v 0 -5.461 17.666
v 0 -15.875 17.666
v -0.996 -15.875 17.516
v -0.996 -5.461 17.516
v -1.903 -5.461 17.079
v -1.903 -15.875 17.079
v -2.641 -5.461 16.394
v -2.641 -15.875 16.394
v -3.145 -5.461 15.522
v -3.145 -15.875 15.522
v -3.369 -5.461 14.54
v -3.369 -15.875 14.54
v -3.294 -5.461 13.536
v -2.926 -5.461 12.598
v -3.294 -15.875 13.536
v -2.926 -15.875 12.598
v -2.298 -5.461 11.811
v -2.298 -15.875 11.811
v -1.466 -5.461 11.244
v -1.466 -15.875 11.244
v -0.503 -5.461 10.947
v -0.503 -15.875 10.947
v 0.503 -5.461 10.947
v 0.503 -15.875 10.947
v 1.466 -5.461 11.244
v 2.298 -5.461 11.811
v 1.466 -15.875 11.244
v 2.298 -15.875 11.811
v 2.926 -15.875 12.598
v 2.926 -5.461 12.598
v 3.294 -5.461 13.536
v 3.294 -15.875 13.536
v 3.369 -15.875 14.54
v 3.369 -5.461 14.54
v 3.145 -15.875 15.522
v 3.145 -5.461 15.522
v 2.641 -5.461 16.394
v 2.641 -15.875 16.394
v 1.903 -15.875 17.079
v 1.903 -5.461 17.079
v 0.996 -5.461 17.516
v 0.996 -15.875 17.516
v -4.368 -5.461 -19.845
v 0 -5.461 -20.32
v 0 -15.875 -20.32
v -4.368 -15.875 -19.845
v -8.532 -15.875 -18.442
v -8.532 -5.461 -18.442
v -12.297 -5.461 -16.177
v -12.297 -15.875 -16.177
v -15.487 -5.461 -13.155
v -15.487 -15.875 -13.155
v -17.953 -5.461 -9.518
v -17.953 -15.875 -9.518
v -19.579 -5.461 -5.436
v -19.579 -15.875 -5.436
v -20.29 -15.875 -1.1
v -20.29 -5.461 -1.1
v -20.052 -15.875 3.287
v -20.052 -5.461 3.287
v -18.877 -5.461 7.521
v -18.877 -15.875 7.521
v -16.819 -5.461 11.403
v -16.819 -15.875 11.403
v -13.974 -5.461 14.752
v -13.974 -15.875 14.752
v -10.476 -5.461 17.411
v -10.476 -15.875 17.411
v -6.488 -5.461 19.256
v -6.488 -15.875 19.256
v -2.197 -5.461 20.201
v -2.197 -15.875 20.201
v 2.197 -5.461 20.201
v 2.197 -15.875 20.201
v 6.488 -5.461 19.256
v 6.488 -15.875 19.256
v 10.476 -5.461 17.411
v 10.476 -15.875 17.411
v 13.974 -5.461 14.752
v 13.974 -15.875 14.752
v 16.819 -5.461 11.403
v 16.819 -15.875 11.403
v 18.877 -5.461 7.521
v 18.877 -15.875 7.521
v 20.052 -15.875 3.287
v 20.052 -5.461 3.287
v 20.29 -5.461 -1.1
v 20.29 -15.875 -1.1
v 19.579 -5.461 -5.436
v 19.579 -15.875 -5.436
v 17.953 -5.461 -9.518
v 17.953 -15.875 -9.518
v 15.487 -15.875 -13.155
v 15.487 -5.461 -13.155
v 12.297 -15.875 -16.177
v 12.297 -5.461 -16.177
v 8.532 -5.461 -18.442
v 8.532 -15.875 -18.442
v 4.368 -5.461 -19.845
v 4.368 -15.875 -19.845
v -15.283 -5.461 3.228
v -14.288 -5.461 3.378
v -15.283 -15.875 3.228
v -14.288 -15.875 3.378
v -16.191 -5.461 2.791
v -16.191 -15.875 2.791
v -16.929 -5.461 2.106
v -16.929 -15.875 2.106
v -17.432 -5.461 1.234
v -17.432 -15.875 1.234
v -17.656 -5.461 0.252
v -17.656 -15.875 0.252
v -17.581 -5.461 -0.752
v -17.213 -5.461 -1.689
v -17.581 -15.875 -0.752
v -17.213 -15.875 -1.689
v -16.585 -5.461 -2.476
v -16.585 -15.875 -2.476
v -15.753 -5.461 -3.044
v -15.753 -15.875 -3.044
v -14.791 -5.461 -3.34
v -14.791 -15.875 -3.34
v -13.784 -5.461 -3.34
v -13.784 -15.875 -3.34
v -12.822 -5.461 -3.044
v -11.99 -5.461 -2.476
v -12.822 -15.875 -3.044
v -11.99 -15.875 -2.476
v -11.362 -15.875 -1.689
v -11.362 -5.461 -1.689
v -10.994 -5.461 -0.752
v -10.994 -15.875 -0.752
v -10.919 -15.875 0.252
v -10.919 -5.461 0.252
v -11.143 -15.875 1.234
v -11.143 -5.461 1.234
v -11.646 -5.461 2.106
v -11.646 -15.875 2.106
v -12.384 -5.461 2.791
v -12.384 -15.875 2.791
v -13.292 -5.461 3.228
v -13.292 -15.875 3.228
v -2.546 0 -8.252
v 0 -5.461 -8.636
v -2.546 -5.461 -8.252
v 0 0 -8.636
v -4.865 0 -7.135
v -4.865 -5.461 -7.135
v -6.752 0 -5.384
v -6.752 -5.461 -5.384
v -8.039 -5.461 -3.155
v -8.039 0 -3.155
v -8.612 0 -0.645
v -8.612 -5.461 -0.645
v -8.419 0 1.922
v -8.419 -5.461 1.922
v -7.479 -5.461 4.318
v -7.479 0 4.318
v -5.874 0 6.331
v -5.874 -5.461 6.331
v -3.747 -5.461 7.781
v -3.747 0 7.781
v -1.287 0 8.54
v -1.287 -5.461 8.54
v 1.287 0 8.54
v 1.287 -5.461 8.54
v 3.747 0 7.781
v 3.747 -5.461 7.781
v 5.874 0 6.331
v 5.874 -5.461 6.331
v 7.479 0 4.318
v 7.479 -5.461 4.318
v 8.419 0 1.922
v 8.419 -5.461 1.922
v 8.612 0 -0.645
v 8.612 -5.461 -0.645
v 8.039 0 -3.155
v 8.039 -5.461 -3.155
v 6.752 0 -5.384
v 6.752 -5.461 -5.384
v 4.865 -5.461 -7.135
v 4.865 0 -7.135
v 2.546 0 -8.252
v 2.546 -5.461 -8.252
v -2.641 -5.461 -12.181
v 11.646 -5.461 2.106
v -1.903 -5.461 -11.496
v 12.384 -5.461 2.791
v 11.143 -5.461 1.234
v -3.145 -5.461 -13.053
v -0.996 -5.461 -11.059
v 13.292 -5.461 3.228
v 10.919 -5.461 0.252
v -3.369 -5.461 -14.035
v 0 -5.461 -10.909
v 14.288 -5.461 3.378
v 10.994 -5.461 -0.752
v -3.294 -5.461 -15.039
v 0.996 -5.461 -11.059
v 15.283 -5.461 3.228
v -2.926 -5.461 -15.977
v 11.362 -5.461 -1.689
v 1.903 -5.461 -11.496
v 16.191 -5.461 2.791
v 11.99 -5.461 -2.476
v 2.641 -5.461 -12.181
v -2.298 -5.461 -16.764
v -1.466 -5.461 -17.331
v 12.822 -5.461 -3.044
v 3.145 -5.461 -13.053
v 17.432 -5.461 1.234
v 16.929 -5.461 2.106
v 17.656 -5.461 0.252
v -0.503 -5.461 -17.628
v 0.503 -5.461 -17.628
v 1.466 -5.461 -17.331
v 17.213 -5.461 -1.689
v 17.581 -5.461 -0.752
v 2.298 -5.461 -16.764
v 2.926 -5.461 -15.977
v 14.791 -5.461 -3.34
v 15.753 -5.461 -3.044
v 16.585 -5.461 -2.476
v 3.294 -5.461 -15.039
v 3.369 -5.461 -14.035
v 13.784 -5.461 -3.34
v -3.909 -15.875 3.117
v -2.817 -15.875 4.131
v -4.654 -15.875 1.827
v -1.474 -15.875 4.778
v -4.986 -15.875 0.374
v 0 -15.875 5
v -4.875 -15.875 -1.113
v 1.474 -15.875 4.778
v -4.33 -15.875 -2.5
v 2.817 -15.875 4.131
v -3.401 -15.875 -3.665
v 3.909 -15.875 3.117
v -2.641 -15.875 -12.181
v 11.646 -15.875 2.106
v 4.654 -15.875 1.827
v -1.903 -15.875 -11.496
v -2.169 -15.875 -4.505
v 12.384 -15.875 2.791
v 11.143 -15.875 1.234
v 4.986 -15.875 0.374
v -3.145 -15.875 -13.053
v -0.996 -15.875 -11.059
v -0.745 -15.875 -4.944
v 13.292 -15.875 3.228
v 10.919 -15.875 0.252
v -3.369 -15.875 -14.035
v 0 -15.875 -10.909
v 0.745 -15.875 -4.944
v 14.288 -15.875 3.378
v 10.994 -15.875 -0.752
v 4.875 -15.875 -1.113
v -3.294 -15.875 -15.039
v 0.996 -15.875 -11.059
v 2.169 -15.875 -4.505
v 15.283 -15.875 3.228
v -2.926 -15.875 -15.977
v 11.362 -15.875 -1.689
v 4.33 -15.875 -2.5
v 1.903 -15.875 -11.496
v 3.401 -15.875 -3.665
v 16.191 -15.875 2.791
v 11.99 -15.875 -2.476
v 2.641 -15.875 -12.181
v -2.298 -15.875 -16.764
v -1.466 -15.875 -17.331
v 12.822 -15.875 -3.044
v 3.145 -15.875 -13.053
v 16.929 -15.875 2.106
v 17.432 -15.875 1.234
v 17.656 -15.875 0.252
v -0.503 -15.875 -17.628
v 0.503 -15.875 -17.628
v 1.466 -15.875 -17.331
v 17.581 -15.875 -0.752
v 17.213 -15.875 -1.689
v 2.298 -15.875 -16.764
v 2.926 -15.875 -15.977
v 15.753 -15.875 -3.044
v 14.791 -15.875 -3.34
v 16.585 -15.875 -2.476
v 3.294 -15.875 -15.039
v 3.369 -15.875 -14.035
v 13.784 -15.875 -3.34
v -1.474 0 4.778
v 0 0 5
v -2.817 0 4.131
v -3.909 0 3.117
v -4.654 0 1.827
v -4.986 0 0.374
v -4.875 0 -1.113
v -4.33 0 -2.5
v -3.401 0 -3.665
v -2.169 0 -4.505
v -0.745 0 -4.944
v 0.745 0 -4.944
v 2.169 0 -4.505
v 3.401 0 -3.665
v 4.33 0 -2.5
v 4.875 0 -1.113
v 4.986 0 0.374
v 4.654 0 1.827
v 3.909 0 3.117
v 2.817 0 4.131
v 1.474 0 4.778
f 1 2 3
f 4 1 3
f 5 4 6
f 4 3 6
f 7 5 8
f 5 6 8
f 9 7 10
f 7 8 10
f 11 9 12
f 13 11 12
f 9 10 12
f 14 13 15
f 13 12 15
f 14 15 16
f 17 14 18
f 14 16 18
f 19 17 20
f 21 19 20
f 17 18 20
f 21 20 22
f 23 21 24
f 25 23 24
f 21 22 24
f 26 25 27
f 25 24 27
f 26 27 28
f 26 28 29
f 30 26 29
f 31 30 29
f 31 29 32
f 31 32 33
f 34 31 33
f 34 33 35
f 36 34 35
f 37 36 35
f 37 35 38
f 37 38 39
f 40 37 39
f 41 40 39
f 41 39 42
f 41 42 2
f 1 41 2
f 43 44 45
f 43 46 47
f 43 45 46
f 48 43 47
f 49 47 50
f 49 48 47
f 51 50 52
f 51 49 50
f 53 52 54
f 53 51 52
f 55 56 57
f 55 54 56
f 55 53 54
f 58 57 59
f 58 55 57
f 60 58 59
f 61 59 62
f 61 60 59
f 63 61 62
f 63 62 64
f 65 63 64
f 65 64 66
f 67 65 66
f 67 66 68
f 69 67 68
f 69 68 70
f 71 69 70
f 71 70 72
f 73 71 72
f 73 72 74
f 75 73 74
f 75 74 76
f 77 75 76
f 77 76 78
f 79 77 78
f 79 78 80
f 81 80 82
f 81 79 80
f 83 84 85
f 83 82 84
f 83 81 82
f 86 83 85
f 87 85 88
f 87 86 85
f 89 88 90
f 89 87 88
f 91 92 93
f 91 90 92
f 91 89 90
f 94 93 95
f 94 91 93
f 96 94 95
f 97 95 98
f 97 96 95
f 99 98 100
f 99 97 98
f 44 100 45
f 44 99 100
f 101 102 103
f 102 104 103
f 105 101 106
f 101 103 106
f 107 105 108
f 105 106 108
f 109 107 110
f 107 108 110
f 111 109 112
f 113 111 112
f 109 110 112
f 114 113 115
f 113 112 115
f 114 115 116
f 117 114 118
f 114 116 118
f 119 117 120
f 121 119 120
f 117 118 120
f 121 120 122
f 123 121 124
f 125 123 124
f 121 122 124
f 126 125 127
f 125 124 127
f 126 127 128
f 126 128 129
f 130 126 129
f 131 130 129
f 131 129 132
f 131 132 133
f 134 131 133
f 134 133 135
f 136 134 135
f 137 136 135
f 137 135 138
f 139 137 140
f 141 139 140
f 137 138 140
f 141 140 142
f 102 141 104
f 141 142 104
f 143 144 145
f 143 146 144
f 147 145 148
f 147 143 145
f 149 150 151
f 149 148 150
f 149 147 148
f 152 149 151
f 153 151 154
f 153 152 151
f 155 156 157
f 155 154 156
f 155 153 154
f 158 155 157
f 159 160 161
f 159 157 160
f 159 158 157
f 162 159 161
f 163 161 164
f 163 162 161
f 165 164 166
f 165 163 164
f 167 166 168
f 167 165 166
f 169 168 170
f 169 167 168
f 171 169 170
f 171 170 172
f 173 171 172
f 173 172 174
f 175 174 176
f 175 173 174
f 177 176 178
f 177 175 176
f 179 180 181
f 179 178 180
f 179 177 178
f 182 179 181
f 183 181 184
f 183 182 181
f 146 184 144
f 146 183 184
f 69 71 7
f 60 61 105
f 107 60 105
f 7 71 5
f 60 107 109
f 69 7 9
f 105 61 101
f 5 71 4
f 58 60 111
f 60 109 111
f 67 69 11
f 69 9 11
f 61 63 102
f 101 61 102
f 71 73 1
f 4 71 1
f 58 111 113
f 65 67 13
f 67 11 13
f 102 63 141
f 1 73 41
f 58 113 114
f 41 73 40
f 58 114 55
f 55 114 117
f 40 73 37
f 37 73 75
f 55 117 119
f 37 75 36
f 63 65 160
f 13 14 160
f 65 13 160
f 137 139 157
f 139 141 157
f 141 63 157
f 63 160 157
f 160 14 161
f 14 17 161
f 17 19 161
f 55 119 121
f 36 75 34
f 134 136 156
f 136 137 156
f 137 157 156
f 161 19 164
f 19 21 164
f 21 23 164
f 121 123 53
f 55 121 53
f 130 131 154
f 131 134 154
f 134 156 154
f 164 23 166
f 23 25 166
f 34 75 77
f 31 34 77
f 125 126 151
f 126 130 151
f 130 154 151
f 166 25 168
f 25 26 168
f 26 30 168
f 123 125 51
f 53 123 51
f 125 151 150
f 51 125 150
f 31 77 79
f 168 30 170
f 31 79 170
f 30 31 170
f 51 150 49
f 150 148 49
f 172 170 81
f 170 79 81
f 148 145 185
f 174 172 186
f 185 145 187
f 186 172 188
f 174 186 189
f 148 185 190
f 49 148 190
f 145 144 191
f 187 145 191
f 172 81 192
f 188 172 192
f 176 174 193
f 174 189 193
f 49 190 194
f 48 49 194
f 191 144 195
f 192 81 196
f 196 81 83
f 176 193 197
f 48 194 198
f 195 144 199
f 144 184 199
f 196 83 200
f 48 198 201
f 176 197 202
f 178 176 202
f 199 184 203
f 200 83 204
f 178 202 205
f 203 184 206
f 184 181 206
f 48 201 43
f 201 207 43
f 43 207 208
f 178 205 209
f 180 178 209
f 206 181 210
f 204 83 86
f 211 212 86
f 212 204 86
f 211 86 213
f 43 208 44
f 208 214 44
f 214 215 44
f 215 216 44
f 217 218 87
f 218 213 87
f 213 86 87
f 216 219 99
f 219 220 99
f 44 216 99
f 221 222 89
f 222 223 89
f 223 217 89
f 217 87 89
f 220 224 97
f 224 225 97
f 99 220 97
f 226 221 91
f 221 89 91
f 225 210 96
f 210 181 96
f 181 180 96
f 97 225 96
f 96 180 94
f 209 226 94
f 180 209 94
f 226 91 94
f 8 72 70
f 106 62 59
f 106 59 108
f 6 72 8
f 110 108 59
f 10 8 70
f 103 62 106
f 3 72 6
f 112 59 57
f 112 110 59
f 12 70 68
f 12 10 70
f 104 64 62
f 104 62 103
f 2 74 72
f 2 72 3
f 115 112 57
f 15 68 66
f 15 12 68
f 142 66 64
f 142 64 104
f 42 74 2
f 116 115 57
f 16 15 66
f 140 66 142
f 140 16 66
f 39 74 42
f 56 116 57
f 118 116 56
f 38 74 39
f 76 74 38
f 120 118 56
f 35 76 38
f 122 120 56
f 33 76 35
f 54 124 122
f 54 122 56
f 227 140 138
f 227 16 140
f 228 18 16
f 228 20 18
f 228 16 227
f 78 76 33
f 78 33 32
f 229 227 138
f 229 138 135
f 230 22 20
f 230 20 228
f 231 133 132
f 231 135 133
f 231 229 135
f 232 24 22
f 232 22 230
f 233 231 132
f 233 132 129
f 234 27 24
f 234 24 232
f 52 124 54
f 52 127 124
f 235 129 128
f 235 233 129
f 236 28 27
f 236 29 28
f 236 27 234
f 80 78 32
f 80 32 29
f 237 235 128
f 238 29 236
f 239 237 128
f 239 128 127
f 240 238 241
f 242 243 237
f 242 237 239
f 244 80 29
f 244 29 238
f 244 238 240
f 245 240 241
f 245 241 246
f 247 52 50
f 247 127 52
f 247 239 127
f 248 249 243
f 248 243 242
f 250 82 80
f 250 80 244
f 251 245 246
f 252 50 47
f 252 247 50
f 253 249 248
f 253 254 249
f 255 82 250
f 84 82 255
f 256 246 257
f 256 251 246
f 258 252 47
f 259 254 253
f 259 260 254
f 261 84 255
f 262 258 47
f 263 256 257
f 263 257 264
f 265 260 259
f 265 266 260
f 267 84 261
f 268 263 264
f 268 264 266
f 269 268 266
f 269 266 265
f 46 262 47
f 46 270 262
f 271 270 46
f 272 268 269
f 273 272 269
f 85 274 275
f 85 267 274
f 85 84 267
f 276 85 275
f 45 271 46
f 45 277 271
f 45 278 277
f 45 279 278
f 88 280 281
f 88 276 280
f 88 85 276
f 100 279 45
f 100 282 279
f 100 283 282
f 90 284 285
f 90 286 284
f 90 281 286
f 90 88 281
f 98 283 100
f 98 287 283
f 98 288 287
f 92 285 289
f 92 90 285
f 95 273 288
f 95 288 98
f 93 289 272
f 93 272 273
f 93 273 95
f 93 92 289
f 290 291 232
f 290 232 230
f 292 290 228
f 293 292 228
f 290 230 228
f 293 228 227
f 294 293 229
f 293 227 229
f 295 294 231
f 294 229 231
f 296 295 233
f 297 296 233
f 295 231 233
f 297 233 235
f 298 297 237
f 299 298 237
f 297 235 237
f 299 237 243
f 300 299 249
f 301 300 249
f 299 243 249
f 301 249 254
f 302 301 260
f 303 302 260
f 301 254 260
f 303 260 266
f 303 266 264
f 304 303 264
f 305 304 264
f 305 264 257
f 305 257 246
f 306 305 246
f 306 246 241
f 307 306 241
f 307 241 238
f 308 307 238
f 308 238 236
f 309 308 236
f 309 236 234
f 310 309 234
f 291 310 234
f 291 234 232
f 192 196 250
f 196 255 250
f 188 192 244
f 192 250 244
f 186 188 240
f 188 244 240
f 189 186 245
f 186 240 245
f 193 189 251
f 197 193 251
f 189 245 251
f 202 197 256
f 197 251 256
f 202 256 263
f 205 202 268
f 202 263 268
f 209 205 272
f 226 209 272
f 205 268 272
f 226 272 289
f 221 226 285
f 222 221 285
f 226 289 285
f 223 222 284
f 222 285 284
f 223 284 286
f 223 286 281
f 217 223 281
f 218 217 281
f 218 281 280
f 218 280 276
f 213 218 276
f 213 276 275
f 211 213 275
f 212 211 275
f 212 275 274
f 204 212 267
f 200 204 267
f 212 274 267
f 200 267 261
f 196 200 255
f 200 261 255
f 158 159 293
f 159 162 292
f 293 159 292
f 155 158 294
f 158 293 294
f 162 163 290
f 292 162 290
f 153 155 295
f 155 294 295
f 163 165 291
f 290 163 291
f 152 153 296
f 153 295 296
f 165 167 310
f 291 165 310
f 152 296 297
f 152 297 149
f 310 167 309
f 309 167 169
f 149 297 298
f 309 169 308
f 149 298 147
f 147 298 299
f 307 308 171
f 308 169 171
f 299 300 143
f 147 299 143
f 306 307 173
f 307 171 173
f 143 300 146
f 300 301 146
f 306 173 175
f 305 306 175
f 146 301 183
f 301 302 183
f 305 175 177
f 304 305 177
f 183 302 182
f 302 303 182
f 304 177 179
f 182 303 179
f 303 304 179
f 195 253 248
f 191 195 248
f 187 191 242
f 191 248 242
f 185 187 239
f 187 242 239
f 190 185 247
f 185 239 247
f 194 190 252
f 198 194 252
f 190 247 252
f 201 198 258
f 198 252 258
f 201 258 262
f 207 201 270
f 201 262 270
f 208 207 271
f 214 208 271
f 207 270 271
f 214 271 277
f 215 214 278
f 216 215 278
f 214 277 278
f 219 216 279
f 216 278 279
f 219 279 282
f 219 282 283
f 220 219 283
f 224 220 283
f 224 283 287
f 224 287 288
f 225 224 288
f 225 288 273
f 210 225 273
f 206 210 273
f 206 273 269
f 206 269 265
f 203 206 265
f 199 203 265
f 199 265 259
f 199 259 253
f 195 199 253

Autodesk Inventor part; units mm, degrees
ref_plane "YZ Plane" through (0, 0, 0) normal (1, 0, 0) x (0, 1, 0)
ref_plane "XZ Plane" through (0, 0, 0) normal (0, 1, 0) x (-1, 0, 0)
ref_plane "XY Plane" through (0, 0, 0) normal (0, 0, 1) x (1, 0, 0)
sketch "Sketch1" plane through (0, 0, 0) normal (1, 0, 0) x (0, 1, 0)
  line L0 (0, 0) -> (-15.875, 0)
  line L1 (-15.875, 0) -> (-15.875, -20.32)
  line L2 (-15.875, -20.32) -> (-5.461, -20.32)
  line L3 (-5.461, -20.32) -> (-5.461, -8.636)
  line L4 (-5.461, -8.636) -> (0, -8.636)
  line L5 (0, -8.636) -> (0, 0)
  dimension "d0" = 15.875
  dimension "d1" = 10.414
  dimension "d2" = 20.32
  dimension "d3" = 8.636
revolve "Revolution1" add sketch "Sketch1" angle 360 about axis through (0, 0, 0) along (0, -1, 0)
sketch "Sketch3" plane through (0, 0, 0) normal (0, 1, 0) x (1, 0, 0)
  line L0 (0, -31.0012) -> (0, 35.3144)
  line L1 (-32.7265, 0) -> (26.1488, 0)
  point P0 (0, 0)
  point P1 (-14.2875, 0)
  point P2 (0, 0)
  point P3 (0, 14.2875)
  point P4 (14.2875, 0)
  point P5 (0, -14.2875)
  dimension "d23" = 28.575
  dimension "d24" = 28.575
hole "Hole3" at (0, 0, 0) direction (0, -1, 0) diameter 10 end through all
hole "Hole4" at (0, 0, -14.2875) at (-14.2875, 0, 0) at (0, 0, 14.2875) at (14.2875, 0, 0) direction (0, -1, 0) diameter 6.7564 end through all
equation "\"d24\" = d23"
properties part number "Flange_Nut_7549K16"
